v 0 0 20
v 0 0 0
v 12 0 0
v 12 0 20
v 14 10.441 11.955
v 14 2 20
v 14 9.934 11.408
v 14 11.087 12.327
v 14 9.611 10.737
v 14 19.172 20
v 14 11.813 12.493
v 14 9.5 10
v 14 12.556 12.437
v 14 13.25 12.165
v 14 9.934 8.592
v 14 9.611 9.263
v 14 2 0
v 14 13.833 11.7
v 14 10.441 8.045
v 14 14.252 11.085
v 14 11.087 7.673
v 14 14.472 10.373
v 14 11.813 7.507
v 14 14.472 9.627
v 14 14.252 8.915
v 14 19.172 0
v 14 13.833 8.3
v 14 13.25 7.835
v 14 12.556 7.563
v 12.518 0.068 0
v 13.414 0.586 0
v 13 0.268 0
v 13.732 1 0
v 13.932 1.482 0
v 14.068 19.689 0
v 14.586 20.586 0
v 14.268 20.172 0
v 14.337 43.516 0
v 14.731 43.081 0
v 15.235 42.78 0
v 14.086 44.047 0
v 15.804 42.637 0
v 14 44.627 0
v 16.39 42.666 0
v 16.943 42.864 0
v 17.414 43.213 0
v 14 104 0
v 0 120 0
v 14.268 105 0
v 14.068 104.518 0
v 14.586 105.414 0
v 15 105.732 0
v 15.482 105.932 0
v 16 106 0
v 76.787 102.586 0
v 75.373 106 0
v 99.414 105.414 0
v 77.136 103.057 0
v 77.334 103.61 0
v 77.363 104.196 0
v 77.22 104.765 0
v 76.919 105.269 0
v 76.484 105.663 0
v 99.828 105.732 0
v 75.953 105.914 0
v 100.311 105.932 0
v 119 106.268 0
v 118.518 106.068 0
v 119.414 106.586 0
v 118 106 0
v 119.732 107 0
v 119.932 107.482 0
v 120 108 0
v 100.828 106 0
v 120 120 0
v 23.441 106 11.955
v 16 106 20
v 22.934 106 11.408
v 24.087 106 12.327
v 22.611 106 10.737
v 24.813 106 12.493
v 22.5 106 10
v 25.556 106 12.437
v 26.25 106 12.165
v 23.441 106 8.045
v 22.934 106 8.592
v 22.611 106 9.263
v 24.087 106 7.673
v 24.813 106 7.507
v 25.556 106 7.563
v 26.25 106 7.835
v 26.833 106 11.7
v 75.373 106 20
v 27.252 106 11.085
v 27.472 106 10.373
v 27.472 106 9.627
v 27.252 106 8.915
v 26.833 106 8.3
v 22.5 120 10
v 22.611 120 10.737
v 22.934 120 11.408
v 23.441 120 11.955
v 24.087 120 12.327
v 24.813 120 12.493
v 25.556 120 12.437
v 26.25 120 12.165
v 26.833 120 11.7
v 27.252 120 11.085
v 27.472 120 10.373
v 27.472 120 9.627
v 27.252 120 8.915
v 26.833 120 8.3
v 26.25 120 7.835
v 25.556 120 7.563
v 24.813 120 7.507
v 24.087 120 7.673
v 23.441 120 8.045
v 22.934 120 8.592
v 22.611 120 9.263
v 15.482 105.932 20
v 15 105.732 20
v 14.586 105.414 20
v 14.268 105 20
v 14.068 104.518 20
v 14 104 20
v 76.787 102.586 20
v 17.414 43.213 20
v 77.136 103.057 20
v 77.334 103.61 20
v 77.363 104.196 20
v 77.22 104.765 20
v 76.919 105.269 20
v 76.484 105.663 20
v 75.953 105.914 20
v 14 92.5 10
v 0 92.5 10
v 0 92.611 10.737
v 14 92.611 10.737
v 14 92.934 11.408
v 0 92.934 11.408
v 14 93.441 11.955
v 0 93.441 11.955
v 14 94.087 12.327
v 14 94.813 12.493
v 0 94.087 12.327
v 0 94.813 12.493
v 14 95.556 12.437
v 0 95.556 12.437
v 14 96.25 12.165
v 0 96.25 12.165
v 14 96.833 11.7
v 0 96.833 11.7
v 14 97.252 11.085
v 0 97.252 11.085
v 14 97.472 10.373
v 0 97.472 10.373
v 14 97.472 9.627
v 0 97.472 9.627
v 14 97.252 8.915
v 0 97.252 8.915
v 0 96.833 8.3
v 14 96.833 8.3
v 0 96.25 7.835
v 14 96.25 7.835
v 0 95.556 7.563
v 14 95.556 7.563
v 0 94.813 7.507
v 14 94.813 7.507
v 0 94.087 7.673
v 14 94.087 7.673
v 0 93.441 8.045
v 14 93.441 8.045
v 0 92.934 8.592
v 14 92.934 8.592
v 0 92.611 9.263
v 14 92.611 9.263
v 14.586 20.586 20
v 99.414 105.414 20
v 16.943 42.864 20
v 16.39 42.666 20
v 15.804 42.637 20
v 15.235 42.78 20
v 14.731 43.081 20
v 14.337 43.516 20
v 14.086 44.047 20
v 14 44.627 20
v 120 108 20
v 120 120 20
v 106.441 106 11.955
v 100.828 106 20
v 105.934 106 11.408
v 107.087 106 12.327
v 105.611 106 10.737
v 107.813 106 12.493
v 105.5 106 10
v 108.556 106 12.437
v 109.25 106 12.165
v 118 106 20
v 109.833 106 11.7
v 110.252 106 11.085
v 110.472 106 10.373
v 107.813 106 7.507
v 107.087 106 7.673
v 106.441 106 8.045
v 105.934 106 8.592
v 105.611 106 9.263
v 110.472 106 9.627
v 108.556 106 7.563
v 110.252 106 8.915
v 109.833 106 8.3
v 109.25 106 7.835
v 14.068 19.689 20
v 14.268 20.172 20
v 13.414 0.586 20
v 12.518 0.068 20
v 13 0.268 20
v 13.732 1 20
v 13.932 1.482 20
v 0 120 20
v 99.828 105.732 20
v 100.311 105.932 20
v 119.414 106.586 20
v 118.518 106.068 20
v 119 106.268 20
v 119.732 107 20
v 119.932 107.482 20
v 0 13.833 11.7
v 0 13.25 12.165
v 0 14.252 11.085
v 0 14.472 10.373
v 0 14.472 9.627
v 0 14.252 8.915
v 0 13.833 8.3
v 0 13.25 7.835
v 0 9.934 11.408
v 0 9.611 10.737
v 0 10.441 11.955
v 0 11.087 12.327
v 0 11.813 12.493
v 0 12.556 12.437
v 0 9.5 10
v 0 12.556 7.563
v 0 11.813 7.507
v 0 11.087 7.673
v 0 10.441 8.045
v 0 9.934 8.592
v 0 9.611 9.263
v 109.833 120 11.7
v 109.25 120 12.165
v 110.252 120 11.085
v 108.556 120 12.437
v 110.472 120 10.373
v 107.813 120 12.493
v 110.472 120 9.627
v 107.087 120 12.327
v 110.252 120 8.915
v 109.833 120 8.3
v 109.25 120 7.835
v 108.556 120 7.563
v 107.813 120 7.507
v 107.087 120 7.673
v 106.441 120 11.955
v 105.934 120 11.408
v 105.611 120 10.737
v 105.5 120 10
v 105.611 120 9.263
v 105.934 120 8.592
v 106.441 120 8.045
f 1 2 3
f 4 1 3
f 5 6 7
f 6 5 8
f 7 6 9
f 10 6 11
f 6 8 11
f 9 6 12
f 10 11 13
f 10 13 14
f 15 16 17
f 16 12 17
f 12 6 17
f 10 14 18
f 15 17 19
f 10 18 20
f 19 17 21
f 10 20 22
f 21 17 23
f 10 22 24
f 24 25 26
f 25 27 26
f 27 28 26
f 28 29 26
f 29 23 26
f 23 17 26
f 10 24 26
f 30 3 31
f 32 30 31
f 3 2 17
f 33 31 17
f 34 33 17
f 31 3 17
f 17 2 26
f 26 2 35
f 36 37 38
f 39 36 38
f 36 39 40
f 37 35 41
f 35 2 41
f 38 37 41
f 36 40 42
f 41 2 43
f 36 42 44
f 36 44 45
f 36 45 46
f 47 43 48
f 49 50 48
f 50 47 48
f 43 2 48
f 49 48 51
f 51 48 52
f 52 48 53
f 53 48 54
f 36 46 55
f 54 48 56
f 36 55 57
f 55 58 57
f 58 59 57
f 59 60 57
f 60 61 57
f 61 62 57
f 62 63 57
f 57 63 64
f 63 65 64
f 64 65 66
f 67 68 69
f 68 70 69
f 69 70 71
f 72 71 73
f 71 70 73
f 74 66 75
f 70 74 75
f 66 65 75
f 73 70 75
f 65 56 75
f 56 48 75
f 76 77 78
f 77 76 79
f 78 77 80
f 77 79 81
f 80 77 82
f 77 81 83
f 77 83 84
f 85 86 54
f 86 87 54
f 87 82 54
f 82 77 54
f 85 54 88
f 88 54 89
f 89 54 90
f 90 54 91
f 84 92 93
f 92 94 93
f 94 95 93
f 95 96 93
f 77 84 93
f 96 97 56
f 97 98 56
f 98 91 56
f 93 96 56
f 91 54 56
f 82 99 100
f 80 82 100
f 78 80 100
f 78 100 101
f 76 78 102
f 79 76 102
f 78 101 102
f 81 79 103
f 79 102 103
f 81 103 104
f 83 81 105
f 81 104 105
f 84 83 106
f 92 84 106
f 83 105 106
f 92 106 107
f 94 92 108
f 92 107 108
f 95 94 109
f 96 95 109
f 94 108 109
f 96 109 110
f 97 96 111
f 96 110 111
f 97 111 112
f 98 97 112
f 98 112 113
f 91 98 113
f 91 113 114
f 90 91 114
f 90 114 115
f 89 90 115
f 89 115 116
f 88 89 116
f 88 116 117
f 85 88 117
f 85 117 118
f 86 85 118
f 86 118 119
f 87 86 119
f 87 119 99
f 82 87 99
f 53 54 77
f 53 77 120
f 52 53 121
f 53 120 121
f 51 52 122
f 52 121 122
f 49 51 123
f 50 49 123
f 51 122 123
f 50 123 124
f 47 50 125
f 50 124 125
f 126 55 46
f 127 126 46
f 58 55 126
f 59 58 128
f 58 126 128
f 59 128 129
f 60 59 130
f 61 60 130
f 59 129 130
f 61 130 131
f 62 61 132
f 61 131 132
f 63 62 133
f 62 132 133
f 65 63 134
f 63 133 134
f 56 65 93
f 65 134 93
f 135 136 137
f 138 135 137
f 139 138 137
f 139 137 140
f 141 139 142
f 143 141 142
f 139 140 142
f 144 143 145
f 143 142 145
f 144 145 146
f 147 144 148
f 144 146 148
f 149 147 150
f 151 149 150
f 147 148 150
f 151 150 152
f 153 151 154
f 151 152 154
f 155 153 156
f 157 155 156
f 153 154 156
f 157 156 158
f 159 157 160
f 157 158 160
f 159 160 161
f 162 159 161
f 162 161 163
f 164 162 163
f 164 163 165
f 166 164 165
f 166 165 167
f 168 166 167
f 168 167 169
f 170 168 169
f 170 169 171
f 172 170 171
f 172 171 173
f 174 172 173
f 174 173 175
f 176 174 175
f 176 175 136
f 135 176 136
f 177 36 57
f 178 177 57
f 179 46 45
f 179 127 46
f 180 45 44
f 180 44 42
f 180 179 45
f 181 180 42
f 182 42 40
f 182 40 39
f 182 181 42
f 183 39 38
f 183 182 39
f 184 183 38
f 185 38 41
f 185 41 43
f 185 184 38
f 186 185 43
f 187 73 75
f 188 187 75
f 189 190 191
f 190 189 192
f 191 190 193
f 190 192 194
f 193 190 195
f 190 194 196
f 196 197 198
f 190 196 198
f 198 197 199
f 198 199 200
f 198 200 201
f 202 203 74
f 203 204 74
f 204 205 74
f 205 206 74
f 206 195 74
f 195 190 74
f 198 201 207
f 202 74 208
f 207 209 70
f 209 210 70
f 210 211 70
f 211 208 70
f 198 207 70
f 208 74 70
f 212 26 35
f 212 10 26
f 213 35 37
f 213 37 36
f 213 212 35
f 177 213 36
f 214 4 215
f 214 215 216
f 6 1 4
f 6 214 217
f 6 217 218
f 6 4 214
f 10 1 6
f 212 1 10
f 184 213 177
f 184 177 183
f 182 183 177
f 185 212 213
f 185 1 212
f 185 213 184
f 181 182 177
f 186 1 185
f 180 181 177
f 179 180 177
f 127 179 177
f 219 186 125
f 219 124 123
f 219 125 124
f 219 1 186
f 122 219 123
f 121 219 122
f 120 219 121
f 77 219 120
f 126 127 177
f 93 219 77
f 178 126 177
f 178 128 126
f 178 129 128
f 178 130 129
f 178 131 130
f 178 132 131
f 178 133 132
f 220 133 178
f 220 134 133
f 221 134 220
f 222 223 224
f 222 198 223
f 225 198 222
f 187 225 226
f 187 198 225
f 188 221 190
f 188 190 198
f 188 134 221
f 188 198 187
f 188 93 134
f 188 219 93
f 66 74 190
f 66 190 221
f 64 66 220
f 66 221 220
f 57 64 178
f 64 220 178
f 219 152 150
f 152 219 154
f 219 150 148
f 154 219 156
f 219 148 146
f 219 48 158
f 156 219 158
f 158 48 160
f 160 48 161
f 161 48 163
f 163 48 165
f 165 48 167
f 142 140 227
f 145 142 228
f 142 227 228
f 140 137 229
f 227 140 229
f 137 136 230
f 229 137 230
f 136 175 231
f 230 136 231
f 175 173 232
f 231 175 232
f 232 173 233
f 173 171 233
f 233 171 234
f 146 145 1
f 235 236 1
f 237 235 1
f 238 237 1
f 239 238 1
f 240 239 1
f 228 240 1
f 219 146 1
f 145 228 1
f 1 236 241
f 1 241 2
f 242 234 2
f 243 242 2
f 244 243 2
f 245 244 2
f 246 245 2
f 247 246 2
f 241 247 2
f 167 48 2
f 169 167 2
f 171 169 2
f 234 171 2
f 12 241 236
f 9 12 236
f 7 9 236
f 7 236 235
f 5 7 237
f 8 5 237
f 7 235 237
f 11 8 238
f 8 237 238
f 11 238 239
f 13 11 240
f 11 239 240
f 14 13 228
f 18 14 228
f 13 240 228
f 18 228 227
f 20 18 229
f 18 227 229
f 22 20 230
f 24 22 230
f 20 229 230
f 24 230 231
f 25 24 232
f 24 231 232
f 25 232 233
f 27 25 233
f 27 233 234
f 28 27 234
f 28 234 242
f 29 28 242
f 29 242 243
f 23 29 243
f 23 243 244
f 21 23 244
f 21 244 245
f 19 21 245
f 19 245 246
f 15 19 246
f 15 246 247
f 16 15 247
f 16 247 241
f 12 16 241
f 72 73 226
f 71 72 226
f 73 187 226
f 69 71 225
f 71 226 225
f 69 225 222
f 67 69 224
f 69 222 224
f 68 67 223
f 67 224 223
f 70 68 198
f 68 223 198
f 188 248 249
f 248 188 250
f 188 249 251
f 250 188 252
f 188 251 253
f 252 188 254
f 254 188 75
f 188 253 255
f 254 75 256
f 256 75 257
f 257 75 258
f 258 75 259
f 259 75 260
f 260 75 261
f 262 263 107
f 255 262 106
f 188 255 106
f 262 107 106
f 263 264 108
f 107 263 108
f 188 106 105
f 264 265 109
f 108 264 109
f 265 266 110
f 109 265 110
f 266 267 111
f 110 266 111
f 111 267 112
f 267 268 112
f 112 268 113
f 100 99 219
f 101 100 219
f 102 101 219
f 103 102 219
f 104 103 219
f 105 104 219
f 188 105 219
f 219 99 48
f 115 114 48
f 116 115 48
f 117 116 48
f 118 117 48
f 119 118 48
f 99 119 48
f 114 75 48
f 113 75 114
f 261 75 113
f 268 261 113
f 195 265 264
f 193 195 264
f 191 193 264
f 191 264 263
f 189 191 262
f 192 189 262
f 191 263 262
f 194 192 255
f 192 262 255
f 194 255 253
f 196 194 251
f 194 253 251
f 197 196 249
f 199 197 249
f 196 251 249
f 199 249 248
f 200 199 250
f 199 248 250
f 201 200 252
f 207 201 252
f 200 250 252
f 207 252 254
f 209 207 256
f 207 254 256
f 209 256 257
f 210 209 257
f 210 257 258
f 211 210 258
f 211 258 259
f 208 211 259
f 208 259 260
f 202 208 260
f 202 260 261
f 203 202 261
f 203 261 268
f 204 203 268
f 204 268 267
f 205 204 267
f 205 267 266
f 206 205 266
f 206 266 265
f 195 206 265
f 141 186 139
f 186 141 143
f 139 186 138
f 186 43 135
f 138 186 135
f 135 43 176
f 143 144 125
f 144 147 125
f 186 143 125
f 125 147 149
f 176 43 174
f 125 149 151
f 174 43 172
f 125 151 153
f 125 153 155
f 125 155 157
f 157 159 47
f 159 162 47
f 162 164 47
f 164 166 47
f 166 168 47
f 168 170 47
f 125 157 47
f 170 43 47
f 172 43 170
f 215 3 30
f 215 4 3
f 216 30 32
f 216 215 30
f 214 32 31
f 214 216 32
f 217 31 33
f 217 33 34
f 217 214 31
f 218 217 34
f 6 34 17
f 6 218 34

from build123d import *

# Parameters (mm, degrees)
F1_DEPTH = 20
F2_R     = 2.5
F3_DEPTH = 25
F4_R     = 2.5
F5_DEPTH = 25
F6_R     = 2


with BuildPart() as f1:
    # F0 (on Top) → F1 (new body)
    with BuildSketch(Plane.XY):
        Polygon((0, 120), (0, 0), (14, 0), (14, 20), (100, 106), (120, 106), (120, 120), align=None)
        Polygon((14, 39.79899), (14, 106), (80.20101, 106), align=None, mode=Mode.SUBTRACT)
    extrude(amount=F1_DEPTH)

    # F2 (on face) → F3 (cut)
    with BuildSketch(Plane(origin=(0, 0, 0), x_dir=(0, -1, 0), z_dir=(-1, 0, 0))):
        with Locations((-12, 10)):
            Circle(F2_R)
        with Locations((-95, 10)):
            Circle(F2_R)
    extrude(amount=-F3_DEPTH, mode=Mode.SUBTRACT)

    # F4 (on face) → F5 (cut)
    with BuildSketch(Plane(origin=(0, 120, 0), x_dir=(-1, 0, 0), z_dir=(0, 1, 0))):
        with Locations((-108, 10)):
            Circle(F4_R)
        with Locations((-25, 10)):
            Circle(F4_R)
    extrude(amount=-F5_DEPTH, mode=Mode.SUBTRACT)

    # F6
    f6_edges = [f1.edges().sort_by_distance(p)[0] for p in [
        (14, 39.79899, 10),
        (14, 106, 10),
        (80.20101, 106, 10),
        (14, 20, 10),
        (100, 106, 10),
        (120, 106, 10),
        (14, 0, 10),
    ]]
    fillet(f6_edges, radius=F6_R)


solid = f1.part
